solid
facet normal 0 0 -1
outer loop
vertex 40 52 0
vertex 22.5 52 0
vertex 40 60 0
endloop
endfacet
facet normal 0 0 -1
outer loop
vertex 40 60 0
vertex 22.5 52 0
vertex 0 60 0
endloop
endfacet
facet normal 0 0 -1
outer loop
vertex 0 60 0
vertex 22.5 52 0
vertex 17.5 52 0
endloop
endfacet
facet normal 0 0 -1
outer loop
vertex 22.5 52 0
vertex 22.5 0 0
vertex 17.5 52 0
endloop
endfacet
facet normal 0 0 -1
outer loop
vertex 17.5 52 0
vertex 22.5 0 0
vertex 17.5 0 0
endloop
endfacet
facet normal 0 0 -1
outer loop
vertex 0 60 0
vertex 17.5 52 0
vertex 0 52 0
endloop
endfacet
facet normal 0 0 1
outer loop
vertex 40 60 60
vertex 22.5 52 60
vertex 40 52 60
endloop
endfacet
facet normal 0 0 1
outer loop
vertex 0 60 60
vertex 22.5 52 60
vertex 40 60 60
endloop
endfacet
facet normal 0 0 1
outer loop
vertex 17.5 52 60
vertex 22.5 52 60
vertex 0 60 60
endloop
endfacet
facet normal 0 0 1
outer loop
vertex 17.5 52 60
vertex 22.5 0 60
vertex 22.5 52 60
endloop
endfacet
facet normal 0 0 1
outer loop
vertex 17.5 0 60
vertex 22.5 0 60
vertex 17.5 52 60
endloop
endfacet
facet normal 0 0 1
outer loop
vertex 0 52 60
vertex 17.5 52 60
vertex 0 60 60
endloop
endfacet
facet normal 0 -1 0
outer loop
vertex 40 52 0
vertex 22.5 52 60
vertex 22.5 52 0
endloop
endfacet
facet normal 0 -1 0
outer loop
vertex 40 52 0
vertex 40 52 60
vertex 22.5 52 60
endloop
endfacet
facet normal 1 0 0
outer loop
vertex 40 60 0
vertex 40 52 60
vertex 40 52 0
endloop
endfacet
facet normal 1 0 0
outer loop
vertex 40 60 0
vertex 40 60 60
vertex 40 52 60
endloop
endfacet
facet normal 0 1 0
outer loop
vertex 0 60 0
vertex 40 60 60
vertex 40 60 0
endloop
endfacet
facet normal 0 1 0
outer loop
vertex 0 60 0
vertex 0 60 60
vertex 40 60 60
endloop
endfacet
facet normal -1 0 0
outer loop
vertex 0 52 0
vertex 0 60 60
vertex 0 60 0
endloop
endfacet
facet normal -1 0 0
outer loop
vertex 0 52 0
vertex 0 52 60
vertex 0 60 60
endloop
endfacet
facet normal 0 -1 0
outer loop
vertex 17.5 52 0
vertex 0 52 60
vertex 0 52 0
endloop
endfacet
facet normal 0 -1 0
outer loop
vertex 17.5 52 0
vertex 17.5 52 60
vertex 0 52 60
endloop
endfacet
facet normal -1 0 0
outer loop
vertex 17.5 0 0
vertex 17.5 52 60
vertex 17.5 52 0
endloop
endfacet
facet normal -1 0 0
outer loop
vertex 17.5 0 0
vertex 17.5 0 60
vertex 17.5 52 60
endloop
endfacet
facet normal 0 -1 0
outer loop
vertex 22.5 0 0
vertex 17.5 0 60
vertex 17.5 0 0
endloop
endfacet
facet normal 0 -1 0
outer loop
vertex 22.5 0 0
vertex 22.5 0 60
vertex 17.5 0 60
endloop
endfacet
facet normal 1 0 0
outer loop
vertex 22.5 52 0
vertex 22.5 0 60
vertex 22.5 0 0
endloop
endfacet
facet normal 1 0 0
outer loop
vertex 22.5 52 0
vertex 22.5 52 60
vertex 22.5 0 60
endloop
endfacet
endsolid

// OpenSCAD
$fn = 32;

// ----------------------------------------------------------------------
// Structural section: tee 40 x 60 mm
// ----------------------------------------------------------------------

// --- parameters (mm) ---
sec_w = 40;               // tee width, X
sec_h = 60;               // tee height, Y
flange_t = 8;             // top flange thickness
web_t = 5;                // web thickness
plate_t = 60;             // cut length, Z (extrusion height)
fit_tol = 0.1;            // declared fit tolerance (prompt contract)
free_tol = 0.3;           // declared free tolerance (prompt contract)

profile = [[17.5, 0], [22.5, 0], [22.5, 52], [40, 52], [40, 60], [0, 60], [0, 52], [17.5, 52]];  // primary outline, 8 points, counter clockwise

// --- the one profile operation ---
linear_extrude(height = plate_t) polygon(points = profile);
